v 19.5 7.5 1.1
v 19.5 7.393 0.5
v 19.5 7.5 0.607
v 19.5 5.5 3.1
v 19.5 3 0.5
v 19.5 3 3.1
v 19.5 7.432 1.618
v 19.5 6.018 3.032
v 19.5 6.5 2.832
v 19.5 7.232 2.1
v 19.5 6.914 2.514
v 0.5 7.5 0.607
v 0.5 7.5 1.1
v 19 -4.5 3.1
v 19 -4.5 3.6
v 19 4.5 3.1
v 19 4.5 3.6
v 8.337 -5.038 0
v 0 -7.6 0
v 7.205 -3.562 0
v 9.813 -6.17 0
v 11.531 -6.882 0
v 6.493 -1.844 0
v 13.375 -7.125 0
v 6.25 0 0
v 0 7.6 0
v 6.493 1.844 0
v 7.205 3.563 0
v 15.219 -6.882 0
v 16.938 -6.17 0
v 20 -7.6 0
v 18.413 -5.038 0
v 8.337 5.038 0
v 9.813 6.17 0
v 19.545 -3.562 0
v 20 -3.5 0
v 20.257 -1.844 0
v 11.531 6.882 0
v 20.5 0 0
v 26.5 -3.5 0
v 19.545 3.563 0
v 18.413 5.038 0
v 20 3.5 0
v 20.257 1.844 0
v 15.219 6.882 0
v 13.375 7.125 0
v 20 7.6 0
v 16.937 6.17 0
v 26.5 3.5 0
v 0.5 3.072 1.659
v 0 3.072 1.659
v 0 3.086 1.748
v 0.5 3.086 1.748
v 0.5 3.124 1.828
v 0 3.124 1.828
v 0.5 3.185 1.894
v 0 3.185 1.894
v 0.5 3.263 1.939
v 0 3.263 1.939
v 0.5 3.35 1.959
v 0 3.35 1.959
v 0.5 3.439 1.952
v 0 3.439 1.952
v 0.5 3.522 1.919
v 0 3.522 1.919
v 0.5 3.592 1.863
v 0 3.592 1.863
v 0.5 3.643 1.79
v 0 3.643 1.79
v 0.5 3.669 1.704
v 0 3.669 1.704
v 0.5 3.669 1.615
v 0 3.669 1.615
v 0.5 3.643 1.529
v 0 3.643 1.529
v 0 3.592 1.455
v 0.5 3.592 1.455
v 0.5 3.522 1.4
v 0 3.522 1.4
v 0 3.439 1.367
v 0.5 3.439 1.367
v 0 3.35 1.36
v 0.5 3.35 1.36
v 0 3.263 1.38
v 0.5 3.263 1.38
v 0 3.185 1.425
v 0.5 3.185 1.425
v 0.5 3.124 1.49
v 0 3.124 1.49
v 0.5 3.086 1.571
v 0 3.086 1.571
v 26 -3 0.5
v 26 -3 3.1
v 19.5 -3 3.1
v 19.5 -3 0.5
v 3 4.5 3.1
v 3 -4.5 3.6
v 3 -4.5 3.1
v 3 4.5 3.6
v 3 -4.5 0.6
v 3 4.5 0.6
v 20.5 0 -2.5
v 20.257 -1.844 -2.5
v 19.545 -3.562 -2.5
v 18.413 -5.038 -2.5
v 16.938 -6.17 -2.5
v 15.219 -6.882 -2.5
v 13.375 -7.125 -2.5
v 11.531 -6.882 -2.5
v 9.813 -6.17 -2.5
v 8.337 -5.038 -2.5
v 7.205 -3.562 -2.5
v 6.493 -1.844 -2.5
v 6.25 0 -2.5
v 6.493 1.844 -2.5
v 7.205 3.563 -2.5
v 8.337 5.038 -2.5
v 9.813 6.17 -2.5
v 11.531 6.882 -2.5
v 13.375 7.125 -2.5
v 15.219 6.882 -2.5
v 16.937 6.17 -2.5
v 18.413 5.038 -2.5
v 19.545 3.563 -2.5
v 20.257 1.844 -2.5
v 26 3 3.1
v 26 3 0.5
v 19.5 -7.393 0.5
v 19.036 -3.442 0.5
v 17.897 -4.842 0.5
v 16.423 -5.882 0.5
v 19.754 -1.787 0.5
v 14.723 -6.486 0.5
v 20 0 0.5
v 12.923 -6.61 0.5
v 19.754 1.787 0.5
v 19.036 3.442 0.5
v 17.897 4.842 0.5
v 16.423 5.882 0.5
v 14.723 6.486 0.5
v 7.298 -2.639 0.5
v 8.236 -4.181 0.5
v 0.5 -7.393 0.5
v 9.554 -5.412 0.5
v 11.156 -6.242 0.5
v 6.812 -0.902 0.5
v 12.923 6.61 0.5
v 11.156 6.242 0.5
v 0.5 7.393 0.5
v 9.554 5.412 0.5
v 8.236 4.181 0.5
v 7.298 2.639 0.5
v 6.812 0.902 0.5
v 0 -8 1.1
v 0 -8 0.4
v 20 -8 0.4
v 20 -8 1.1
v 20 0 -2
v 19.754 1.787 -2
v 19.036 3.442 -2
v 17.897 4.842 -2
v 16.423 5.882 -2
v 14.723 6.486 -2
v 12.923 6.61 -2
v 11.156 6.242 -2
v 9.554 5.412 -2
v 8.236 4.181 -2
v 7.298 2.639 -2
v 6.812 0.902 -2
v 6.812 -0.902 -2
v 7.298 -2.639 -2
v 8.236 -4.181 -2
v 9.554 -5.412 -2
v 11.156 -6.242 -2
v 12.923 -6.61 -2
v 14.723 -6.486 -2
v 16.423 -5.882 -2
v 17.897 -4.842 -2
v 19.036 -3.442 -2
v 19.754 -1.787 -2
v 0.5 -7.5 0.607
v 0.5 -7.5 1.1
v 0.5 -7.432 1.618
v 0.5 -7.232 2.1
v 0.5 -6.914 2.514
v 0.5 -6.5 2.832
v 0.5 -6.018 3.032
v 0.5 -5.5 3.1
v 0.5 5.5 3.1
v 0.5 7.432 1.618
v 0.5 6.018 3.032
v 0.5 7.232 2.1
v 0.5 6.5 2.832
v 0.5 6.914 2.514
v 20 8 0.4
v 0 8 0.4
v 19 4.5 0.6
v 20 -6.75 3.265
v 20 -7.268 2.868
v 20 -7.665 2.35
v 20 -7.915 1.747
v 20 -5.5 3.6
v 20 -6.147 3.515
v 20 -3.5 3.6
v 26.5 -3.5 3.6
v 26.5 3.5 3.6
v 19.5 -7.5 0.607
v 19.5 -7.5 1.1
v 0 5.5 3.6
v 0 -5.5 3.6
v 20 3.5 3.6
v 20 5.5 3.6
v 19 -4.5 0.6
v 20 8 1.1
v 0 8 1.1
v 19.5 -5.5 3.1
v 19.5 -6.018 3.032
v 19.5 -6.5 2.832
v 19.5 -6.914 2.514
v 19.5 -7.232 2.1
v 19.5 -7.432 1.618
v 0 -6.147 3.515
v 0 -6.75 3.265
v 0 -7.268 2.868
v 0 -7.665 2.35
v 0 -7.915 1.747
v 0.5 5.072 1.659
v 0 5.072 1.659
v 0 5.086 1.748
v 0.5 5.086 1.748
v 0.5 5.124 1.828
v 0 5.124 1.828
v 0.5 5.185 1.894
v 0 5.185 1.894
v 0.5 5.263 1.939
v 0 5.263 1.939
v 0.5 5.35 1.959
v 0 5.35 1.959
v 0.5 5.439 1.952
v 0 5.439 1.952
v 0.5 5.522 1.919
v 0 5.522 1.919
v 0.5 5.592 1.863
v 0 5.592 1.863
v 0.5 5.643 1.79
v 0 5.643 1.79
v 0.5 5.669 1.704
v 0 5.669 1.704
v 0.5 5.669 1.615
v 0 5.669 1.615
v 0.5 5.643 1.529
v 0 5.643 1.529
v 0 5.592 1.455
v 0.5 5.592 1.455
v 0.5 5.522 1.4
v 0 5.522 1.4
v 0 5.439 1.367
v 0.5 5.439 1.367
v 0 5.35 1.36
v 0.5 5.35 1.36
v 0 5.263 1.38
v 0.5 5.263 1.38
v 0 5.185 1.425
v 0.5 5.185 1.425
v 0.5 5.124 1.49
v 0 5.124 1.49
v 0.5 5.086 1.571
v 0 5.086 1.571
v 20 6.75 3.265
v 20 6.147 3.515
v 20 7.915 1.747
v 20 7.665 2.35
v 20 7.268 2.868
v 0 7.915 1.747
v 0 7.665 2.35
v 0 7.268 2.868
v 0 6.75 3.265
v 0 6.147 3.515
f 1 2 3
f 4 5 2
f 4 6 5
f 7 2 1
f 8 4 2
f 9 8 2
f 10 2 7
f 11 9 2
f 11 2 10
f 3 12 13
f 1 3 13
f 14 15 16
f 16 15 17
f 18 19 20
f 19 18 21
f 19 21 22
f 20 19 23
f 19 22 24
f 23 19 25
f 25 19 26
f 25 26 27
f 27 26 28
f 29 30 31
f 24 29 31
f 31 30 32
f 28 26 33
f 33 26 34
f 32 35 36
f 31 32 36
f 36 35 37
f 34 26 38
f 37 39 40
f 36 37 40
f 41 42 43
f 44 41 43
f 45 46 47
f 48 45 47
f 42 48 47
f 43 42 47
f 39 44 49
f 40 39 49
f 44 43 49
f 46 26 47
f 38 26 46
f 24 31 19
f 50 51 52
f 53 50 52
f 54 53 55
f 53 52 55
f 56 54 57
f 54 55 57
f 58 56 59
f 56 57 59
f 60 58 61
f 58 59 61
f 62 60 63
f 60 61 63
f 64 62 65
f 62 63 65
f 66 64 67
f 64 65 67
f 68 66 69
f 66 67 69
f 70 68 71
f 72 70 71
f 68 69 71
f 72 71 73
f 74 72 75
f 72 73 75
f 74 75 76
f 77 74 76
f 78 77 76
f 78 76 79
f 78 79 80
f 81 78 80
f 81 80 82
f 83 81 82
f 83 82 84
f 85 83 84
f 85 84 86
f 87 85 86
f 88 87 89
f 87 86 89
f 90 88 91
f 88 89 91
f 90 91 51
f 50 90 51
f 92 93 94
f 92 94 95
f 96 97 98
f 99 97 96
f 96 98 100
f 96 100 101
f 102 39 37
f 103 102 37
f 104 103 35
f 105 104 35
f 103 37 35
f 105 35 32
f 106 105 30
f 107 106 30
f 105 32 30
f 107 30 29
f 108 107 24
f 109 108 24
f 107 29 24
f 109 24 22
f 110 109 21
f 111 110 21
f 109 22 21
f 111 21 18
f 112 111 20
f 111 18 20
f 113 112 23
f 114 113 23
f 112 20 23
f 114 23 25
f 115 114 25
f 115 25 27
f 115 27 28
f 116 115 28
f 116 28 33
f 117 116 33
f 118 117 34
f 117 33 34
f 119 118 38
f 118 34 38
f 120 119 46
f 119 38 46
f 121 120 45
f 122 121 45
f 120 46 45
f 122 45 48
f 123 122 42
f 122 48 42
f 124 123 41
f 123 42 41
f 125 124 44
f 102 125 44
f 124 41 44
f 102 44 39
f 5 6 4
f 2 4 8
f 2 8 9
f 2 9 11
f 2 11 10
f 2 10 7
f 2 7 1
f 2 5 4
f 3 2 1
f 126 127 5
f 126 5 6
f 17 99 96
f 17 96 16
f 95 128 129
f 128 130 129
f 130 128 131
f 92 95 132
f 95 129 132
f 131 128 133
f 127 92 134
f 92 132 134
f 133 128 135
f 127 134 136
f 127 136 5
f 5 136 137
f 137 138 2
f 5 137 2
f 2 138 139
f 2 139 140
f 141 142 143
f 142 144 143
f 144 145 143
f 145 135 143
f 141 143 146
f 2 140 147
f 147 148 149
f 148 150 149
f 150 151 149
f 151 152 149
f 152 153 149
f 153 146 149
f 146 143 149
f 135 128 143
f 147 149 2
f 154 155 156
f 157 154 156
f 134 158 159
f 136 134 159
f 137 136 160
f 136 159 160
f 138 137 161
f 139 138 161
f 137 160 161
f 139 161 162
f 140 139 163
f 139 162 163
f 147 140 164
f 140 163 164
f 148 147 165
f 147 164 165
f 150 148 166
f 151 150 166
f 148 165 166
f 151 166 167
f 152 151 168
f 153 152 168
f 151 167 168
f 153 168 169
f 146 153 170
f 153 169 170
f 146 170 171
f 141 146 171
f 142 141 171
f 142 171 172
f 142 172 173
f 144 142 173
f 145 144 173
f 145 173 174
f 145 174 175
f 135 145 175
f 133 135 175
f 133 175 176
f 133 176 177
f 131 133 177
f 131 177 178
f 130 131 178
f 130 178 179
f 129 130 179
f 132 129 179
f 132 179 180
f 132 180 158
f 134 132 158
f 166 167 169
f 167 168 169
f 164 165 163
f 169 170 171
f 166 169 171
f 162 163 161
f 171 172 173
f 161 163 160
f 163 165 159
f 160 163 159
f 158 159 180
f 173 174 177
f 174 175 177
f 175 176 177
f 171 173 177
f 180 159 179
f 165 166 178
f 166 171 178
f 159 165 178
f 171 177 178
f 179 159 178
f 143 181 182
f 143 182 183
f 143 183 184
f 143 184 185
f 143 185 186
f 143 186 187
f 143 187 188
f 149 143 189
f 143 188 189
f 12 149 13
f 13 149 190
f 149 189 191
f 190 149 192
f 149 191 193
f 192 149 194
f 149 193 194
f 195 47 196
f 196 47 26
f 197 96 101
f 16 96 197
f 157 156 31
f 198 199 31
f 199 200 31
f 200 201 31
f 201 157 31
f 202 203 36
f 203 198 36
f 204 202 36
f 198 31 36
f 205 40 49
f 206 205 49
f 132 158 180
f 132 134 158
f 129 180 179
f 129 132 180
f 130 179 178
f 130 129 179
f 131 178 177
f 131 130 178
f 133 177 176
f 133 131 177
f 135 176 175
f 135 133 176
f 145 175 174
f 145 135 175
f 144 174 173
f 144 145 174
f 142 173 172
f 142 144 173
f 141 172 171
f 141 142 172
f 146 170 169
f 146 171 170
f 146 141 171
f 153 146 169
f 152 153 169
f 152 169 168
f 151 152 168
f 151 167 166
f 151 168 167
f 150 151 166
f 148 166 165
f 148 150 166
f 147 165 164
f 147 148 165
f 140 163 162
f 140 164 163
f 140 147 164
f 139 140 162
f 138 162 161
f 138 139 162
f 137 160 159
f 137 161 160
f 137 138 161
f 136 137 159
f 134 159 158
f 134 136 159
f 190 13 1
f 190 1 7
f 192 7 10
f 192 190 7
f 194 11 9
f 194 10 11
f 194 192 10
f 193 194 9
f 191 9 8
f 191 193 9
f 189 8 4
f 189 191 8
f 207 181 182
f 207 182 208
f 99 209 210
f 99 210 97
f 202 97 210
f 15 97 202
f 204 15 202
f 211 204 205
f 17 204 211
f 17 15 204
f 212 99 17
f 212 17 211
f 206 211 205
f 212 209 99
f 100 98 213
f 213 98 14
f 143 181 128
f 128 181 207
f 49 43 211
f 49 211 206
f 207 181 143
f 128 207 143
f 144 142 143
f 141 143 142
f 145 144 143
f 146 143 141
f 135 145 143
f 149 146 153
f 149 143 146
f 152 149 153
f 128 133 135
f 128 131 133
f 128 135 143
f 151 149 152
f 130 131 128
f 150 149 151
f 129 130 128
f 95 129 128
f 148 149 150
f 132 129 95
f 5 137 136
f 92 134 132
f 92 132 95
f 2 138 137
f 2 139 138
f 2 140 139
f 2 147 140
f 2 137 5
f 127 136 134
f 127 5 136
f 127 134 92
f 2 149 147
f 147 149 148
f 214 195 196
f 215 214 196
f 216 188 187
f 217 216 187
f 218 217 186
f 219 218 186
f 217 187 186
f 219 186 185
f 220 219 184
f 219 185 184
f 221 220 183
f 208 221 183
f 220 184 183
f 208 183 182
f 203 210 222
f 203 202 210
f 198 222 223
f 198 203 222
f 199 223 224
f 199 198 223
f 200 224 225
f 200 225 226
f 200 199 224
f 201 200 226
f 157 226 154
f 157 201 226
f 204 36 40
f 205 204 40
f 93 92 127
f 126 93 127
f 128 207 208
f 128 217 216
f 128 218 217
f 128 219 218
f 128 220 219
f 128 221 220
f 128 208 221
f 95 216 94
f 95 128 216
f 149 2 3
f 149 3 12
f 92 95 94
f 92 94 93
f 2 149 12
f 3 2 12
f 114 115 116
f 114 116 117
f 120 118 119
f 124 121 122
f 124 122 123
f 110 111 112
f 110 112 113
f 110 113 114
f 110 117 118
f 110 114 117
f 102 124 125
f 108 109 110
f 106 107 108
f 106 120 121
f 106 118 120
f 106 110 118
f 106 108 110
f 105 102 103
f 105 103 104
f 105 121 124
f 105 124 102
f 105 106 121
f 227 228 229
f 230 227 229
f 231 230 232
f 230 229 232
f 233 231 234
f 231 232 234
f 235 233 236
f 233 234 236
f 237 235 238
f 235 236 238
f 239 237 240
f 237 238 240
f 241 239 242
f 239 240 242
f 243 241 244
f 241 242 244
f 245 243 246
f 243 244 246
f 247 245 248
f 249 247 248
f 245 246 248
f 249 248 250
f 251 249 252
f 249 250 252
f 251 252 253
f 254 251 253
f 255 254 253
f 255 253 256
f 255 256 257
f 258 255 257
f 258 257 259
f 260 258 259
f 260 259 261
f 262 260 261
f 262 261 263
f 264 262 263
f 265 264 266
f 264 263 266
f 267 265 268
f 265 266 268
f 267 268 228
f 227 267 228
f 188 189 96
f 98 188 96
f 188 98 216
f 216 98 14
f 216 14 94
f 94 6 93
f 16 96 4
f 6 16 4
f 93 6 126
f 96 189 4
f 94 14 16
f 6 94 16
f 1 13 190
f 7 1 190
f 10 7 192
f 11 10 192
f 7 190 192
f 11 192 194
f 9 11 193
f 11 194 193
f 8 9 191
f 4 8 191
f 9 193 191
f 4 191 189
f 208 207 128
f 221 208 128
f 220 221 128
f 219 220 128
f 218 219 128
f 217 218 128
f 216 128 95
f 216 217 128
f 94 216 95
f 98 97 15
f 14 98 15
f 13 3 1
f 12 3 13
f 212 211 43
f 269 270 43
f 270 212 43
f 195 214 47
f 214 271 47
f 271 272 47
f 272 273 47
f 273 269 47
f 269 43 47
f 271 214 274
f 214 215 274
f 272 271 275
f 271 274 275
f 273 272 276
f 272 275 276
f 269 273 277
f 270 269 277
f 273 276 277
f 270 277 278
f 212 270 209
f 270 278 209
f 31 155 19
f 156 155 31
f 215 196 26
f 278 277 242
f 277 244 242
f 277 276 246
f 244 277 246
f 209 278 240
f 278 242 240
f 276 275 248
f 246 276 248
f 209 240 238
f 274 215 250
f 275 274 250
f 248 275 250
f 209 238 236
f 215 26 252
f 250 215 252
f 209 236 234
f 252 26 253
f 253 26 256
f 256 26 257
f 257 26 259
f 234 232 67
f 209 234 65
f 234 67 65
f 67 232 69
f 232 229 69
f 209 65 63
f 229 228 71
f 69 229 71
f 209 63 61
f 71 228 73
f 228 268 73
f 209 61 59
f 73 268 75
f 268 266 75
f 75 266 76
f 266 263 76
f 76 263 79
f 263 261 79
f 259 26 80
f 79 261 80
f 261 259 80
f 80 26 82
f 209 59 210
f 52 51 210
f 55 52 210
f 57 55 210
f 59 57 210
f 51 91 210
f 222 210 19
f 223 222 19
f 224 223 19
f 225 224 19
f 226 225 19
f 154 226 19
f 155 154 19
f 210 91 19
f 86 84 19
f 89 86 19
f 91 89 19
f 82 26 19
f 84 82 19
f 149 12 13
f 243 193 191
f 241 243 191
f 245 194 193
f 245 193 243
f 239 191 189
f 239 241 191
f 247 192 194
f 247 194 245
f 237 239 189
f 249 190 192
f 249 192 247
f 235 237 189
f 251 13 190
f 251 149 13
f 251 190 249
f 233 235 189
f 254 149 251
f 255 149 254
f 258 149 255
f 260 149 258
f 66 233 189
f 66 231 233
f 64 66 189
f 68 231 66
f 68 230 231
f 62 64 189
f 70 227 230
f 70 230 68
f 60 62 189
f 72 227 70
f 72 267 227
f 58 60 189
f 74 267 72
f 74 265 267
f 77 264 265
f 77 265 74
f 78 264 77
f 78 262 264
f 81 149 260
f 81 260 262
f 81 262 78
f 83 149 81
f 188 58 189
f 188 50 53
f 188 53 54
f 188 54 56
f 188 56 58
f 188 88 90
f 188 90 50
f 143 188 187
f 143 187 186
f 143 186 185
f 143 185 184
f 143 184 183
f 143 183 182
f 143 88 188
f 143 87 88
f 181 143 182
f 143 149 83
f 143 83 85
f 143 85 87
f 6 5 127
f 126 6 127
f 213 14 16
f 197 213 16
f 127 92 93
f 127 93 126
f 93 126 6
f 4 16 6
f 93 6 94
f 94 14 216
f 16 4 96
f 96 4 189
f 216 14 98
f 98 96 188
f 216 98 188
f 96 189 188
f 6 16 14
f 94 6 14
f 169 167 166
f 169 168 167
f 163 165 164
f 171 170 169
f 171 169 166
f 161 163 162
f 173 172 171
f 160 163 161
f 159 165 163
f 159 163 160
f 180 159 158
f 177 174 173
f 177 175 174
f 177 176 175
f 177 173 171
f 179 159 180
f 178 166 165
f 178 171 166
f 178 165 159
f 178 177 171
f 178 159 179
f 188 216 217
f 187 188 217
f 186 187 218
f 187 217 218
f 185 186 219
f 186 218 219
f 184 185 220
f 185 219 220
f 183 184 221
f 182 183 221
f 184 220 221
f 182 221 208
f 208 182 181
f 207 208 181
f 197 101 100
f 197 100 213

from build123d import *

# Parameters (mm, degrees)
F0_W      = 6.5
F0_H      = 7
F1_DEPTH  = 3.6
F2_R      = 7.125
F3_DEPTH  = 2.5
F4_W      = 16
F4_H      = 9
F5_DEPTH  = 3
F6_R      = 2.5
F8_SIZE   = 0.4
F9_T      = -0.5
F10_R     = 0.3
F11_DEPTH = 0.5
F12_DEPTH = 2.5
F13_DEPTH = 6.5
F15_DEPTH = 19
F16_W     = 16
F16_H     = 9
F17_DEPTH = 3


with BuildPart() as f1:
    # F0 (on Top) → F1 (new body)
    with BuildSketch(Plane.XY):
        Polygon((20, 8), (0, 8), (0, -8), (20, -8), (20, -3.5), (20, 3.5), align=None)
        with Locations((23.25, 0)):
            Rectangle(F0_W, F0_H)
    extrude(amount=F1_DEPTH)

    # F2 (on face) → F3 (join)
    with BuildSketch(Plane(origin=(0, 0, 0), x_dir=(1, 0, 0), z_dir=(0, 0, -1))):
        with Locations((13.375, 0)):
            Circle(F2_R)
    extrude(amount=F3_DEPTH)

    # F4 (on face) → F5 (cut)
    with BuildSketch(Plane.XY.offset(3.6)):
        with Locations((11, 0)):
            Rectangle(F4_W, F4_H)
    extrude(amount=-F5_DEPTH, mode=Mode.SUBTRACT)

    # F6
    f6_edges = [f1.edges().sort_by_distance(p)[0] for p in [
        (10, 8, 3.6),
        (10, -8, 3.6),
    ]]
    fillet(f6_edges, radius=F6_R)

    # F8
    f8_edges = [f1.edges().sort_by_distance(p)[0] for p in [
        (10, 8, 0),
        (10, -8, 0),
    ]]
    chamfer(f8_edges, length=F8_SIZE)

    # F9
    f9_openings = [f1.faces().sort_by_distance(p)[0] for p in [
        (11, 0, 0.6),
        (11, 4.5, 2.1),
        (19, 0, 2.1),
        (3, 0, 2.1),
        (11, -4.5, 2.1),
    ]]
    offset(amount=F9_T, openings=f9_openings, kind=Kind.INTERSECTION)

    # F10 (on face) → F11 (cut, through all)
    with BuildSketch(Plane(origin=(0, 0, 0), x_dir=(0, -1, 0), z_dir=(-1, 0, 0))):
        with Locations((-5.3723076627, 1.6593972807)):
            Circle(F10_R)
        with Locations((-3.3723076627, 1.6593972807)):
            Circle(F10_R)
    extrude(amount=-F11_DEPTH, mode=Mode.SUBTRACT)


with BuildPart() as f12:
    # F12 (new, through all): a face of the model
    f12_faces = [f1.part.faces().sort_by_distance(p)[0] for p in [
        (13.375, 0, -2),
    ]]
    extrude(f12_faces, amount=F12_DEPTH)



with BuildPart() as f13:
    # F13 (new, through all): a face of the model
    f13_faces = [f1.part.faces().sort_by_distance(p)[0] for p in [
        (26, 0, 1.8),
    ]]
    extrude(f13_faces, amount=F13_DEPTH)


with BuildPart() as f12_1:
    add(f12.part)

    add(f13.part)  # F15 merges F13
    # F14 (on face) → F15 (join, through all)
    with BuildSketch(Plane.YZ.offset(0.5)):
        with BuildLine():
            Line((7.3928932188, 0.5), (7.5, 0.6071067812))
            Line((7.5, 0.6071067812), (7.5, 1.1))
            ThreePointArc((7.5, 1.1), (6.9142135624, 2.5142135624), (5.5, 3.1))
            Line((5.5, 3.1), (-5.5, 3.1))
            ThreePointArc((-5.5, 3.1), (-6.9142135624, 2.5142135624), (-7.5, 1.1))
            Line((-7.5, 1.1), (-7.5, 0.6071067812))
            Line((-7.5, 0.6071067812), (-7.3928932188, 0.5))
            Line((-7.3928932188, 0.5), (7.3928932188, 0.5))
        make_face()
    extrude(amount=F15_DEPTH)

    # F16 (on face) → F17 (cut)
    with BuildSketch(Plane.XY.offset(3.6)):
        with Locations((11, 0)):
            Rectangle(F16_W, F16_H)
    extrude(amount=-F17_DEPTH, mode=Mode.SUBTRACT)


solid = Compound([f1.part, f12_1.part])
